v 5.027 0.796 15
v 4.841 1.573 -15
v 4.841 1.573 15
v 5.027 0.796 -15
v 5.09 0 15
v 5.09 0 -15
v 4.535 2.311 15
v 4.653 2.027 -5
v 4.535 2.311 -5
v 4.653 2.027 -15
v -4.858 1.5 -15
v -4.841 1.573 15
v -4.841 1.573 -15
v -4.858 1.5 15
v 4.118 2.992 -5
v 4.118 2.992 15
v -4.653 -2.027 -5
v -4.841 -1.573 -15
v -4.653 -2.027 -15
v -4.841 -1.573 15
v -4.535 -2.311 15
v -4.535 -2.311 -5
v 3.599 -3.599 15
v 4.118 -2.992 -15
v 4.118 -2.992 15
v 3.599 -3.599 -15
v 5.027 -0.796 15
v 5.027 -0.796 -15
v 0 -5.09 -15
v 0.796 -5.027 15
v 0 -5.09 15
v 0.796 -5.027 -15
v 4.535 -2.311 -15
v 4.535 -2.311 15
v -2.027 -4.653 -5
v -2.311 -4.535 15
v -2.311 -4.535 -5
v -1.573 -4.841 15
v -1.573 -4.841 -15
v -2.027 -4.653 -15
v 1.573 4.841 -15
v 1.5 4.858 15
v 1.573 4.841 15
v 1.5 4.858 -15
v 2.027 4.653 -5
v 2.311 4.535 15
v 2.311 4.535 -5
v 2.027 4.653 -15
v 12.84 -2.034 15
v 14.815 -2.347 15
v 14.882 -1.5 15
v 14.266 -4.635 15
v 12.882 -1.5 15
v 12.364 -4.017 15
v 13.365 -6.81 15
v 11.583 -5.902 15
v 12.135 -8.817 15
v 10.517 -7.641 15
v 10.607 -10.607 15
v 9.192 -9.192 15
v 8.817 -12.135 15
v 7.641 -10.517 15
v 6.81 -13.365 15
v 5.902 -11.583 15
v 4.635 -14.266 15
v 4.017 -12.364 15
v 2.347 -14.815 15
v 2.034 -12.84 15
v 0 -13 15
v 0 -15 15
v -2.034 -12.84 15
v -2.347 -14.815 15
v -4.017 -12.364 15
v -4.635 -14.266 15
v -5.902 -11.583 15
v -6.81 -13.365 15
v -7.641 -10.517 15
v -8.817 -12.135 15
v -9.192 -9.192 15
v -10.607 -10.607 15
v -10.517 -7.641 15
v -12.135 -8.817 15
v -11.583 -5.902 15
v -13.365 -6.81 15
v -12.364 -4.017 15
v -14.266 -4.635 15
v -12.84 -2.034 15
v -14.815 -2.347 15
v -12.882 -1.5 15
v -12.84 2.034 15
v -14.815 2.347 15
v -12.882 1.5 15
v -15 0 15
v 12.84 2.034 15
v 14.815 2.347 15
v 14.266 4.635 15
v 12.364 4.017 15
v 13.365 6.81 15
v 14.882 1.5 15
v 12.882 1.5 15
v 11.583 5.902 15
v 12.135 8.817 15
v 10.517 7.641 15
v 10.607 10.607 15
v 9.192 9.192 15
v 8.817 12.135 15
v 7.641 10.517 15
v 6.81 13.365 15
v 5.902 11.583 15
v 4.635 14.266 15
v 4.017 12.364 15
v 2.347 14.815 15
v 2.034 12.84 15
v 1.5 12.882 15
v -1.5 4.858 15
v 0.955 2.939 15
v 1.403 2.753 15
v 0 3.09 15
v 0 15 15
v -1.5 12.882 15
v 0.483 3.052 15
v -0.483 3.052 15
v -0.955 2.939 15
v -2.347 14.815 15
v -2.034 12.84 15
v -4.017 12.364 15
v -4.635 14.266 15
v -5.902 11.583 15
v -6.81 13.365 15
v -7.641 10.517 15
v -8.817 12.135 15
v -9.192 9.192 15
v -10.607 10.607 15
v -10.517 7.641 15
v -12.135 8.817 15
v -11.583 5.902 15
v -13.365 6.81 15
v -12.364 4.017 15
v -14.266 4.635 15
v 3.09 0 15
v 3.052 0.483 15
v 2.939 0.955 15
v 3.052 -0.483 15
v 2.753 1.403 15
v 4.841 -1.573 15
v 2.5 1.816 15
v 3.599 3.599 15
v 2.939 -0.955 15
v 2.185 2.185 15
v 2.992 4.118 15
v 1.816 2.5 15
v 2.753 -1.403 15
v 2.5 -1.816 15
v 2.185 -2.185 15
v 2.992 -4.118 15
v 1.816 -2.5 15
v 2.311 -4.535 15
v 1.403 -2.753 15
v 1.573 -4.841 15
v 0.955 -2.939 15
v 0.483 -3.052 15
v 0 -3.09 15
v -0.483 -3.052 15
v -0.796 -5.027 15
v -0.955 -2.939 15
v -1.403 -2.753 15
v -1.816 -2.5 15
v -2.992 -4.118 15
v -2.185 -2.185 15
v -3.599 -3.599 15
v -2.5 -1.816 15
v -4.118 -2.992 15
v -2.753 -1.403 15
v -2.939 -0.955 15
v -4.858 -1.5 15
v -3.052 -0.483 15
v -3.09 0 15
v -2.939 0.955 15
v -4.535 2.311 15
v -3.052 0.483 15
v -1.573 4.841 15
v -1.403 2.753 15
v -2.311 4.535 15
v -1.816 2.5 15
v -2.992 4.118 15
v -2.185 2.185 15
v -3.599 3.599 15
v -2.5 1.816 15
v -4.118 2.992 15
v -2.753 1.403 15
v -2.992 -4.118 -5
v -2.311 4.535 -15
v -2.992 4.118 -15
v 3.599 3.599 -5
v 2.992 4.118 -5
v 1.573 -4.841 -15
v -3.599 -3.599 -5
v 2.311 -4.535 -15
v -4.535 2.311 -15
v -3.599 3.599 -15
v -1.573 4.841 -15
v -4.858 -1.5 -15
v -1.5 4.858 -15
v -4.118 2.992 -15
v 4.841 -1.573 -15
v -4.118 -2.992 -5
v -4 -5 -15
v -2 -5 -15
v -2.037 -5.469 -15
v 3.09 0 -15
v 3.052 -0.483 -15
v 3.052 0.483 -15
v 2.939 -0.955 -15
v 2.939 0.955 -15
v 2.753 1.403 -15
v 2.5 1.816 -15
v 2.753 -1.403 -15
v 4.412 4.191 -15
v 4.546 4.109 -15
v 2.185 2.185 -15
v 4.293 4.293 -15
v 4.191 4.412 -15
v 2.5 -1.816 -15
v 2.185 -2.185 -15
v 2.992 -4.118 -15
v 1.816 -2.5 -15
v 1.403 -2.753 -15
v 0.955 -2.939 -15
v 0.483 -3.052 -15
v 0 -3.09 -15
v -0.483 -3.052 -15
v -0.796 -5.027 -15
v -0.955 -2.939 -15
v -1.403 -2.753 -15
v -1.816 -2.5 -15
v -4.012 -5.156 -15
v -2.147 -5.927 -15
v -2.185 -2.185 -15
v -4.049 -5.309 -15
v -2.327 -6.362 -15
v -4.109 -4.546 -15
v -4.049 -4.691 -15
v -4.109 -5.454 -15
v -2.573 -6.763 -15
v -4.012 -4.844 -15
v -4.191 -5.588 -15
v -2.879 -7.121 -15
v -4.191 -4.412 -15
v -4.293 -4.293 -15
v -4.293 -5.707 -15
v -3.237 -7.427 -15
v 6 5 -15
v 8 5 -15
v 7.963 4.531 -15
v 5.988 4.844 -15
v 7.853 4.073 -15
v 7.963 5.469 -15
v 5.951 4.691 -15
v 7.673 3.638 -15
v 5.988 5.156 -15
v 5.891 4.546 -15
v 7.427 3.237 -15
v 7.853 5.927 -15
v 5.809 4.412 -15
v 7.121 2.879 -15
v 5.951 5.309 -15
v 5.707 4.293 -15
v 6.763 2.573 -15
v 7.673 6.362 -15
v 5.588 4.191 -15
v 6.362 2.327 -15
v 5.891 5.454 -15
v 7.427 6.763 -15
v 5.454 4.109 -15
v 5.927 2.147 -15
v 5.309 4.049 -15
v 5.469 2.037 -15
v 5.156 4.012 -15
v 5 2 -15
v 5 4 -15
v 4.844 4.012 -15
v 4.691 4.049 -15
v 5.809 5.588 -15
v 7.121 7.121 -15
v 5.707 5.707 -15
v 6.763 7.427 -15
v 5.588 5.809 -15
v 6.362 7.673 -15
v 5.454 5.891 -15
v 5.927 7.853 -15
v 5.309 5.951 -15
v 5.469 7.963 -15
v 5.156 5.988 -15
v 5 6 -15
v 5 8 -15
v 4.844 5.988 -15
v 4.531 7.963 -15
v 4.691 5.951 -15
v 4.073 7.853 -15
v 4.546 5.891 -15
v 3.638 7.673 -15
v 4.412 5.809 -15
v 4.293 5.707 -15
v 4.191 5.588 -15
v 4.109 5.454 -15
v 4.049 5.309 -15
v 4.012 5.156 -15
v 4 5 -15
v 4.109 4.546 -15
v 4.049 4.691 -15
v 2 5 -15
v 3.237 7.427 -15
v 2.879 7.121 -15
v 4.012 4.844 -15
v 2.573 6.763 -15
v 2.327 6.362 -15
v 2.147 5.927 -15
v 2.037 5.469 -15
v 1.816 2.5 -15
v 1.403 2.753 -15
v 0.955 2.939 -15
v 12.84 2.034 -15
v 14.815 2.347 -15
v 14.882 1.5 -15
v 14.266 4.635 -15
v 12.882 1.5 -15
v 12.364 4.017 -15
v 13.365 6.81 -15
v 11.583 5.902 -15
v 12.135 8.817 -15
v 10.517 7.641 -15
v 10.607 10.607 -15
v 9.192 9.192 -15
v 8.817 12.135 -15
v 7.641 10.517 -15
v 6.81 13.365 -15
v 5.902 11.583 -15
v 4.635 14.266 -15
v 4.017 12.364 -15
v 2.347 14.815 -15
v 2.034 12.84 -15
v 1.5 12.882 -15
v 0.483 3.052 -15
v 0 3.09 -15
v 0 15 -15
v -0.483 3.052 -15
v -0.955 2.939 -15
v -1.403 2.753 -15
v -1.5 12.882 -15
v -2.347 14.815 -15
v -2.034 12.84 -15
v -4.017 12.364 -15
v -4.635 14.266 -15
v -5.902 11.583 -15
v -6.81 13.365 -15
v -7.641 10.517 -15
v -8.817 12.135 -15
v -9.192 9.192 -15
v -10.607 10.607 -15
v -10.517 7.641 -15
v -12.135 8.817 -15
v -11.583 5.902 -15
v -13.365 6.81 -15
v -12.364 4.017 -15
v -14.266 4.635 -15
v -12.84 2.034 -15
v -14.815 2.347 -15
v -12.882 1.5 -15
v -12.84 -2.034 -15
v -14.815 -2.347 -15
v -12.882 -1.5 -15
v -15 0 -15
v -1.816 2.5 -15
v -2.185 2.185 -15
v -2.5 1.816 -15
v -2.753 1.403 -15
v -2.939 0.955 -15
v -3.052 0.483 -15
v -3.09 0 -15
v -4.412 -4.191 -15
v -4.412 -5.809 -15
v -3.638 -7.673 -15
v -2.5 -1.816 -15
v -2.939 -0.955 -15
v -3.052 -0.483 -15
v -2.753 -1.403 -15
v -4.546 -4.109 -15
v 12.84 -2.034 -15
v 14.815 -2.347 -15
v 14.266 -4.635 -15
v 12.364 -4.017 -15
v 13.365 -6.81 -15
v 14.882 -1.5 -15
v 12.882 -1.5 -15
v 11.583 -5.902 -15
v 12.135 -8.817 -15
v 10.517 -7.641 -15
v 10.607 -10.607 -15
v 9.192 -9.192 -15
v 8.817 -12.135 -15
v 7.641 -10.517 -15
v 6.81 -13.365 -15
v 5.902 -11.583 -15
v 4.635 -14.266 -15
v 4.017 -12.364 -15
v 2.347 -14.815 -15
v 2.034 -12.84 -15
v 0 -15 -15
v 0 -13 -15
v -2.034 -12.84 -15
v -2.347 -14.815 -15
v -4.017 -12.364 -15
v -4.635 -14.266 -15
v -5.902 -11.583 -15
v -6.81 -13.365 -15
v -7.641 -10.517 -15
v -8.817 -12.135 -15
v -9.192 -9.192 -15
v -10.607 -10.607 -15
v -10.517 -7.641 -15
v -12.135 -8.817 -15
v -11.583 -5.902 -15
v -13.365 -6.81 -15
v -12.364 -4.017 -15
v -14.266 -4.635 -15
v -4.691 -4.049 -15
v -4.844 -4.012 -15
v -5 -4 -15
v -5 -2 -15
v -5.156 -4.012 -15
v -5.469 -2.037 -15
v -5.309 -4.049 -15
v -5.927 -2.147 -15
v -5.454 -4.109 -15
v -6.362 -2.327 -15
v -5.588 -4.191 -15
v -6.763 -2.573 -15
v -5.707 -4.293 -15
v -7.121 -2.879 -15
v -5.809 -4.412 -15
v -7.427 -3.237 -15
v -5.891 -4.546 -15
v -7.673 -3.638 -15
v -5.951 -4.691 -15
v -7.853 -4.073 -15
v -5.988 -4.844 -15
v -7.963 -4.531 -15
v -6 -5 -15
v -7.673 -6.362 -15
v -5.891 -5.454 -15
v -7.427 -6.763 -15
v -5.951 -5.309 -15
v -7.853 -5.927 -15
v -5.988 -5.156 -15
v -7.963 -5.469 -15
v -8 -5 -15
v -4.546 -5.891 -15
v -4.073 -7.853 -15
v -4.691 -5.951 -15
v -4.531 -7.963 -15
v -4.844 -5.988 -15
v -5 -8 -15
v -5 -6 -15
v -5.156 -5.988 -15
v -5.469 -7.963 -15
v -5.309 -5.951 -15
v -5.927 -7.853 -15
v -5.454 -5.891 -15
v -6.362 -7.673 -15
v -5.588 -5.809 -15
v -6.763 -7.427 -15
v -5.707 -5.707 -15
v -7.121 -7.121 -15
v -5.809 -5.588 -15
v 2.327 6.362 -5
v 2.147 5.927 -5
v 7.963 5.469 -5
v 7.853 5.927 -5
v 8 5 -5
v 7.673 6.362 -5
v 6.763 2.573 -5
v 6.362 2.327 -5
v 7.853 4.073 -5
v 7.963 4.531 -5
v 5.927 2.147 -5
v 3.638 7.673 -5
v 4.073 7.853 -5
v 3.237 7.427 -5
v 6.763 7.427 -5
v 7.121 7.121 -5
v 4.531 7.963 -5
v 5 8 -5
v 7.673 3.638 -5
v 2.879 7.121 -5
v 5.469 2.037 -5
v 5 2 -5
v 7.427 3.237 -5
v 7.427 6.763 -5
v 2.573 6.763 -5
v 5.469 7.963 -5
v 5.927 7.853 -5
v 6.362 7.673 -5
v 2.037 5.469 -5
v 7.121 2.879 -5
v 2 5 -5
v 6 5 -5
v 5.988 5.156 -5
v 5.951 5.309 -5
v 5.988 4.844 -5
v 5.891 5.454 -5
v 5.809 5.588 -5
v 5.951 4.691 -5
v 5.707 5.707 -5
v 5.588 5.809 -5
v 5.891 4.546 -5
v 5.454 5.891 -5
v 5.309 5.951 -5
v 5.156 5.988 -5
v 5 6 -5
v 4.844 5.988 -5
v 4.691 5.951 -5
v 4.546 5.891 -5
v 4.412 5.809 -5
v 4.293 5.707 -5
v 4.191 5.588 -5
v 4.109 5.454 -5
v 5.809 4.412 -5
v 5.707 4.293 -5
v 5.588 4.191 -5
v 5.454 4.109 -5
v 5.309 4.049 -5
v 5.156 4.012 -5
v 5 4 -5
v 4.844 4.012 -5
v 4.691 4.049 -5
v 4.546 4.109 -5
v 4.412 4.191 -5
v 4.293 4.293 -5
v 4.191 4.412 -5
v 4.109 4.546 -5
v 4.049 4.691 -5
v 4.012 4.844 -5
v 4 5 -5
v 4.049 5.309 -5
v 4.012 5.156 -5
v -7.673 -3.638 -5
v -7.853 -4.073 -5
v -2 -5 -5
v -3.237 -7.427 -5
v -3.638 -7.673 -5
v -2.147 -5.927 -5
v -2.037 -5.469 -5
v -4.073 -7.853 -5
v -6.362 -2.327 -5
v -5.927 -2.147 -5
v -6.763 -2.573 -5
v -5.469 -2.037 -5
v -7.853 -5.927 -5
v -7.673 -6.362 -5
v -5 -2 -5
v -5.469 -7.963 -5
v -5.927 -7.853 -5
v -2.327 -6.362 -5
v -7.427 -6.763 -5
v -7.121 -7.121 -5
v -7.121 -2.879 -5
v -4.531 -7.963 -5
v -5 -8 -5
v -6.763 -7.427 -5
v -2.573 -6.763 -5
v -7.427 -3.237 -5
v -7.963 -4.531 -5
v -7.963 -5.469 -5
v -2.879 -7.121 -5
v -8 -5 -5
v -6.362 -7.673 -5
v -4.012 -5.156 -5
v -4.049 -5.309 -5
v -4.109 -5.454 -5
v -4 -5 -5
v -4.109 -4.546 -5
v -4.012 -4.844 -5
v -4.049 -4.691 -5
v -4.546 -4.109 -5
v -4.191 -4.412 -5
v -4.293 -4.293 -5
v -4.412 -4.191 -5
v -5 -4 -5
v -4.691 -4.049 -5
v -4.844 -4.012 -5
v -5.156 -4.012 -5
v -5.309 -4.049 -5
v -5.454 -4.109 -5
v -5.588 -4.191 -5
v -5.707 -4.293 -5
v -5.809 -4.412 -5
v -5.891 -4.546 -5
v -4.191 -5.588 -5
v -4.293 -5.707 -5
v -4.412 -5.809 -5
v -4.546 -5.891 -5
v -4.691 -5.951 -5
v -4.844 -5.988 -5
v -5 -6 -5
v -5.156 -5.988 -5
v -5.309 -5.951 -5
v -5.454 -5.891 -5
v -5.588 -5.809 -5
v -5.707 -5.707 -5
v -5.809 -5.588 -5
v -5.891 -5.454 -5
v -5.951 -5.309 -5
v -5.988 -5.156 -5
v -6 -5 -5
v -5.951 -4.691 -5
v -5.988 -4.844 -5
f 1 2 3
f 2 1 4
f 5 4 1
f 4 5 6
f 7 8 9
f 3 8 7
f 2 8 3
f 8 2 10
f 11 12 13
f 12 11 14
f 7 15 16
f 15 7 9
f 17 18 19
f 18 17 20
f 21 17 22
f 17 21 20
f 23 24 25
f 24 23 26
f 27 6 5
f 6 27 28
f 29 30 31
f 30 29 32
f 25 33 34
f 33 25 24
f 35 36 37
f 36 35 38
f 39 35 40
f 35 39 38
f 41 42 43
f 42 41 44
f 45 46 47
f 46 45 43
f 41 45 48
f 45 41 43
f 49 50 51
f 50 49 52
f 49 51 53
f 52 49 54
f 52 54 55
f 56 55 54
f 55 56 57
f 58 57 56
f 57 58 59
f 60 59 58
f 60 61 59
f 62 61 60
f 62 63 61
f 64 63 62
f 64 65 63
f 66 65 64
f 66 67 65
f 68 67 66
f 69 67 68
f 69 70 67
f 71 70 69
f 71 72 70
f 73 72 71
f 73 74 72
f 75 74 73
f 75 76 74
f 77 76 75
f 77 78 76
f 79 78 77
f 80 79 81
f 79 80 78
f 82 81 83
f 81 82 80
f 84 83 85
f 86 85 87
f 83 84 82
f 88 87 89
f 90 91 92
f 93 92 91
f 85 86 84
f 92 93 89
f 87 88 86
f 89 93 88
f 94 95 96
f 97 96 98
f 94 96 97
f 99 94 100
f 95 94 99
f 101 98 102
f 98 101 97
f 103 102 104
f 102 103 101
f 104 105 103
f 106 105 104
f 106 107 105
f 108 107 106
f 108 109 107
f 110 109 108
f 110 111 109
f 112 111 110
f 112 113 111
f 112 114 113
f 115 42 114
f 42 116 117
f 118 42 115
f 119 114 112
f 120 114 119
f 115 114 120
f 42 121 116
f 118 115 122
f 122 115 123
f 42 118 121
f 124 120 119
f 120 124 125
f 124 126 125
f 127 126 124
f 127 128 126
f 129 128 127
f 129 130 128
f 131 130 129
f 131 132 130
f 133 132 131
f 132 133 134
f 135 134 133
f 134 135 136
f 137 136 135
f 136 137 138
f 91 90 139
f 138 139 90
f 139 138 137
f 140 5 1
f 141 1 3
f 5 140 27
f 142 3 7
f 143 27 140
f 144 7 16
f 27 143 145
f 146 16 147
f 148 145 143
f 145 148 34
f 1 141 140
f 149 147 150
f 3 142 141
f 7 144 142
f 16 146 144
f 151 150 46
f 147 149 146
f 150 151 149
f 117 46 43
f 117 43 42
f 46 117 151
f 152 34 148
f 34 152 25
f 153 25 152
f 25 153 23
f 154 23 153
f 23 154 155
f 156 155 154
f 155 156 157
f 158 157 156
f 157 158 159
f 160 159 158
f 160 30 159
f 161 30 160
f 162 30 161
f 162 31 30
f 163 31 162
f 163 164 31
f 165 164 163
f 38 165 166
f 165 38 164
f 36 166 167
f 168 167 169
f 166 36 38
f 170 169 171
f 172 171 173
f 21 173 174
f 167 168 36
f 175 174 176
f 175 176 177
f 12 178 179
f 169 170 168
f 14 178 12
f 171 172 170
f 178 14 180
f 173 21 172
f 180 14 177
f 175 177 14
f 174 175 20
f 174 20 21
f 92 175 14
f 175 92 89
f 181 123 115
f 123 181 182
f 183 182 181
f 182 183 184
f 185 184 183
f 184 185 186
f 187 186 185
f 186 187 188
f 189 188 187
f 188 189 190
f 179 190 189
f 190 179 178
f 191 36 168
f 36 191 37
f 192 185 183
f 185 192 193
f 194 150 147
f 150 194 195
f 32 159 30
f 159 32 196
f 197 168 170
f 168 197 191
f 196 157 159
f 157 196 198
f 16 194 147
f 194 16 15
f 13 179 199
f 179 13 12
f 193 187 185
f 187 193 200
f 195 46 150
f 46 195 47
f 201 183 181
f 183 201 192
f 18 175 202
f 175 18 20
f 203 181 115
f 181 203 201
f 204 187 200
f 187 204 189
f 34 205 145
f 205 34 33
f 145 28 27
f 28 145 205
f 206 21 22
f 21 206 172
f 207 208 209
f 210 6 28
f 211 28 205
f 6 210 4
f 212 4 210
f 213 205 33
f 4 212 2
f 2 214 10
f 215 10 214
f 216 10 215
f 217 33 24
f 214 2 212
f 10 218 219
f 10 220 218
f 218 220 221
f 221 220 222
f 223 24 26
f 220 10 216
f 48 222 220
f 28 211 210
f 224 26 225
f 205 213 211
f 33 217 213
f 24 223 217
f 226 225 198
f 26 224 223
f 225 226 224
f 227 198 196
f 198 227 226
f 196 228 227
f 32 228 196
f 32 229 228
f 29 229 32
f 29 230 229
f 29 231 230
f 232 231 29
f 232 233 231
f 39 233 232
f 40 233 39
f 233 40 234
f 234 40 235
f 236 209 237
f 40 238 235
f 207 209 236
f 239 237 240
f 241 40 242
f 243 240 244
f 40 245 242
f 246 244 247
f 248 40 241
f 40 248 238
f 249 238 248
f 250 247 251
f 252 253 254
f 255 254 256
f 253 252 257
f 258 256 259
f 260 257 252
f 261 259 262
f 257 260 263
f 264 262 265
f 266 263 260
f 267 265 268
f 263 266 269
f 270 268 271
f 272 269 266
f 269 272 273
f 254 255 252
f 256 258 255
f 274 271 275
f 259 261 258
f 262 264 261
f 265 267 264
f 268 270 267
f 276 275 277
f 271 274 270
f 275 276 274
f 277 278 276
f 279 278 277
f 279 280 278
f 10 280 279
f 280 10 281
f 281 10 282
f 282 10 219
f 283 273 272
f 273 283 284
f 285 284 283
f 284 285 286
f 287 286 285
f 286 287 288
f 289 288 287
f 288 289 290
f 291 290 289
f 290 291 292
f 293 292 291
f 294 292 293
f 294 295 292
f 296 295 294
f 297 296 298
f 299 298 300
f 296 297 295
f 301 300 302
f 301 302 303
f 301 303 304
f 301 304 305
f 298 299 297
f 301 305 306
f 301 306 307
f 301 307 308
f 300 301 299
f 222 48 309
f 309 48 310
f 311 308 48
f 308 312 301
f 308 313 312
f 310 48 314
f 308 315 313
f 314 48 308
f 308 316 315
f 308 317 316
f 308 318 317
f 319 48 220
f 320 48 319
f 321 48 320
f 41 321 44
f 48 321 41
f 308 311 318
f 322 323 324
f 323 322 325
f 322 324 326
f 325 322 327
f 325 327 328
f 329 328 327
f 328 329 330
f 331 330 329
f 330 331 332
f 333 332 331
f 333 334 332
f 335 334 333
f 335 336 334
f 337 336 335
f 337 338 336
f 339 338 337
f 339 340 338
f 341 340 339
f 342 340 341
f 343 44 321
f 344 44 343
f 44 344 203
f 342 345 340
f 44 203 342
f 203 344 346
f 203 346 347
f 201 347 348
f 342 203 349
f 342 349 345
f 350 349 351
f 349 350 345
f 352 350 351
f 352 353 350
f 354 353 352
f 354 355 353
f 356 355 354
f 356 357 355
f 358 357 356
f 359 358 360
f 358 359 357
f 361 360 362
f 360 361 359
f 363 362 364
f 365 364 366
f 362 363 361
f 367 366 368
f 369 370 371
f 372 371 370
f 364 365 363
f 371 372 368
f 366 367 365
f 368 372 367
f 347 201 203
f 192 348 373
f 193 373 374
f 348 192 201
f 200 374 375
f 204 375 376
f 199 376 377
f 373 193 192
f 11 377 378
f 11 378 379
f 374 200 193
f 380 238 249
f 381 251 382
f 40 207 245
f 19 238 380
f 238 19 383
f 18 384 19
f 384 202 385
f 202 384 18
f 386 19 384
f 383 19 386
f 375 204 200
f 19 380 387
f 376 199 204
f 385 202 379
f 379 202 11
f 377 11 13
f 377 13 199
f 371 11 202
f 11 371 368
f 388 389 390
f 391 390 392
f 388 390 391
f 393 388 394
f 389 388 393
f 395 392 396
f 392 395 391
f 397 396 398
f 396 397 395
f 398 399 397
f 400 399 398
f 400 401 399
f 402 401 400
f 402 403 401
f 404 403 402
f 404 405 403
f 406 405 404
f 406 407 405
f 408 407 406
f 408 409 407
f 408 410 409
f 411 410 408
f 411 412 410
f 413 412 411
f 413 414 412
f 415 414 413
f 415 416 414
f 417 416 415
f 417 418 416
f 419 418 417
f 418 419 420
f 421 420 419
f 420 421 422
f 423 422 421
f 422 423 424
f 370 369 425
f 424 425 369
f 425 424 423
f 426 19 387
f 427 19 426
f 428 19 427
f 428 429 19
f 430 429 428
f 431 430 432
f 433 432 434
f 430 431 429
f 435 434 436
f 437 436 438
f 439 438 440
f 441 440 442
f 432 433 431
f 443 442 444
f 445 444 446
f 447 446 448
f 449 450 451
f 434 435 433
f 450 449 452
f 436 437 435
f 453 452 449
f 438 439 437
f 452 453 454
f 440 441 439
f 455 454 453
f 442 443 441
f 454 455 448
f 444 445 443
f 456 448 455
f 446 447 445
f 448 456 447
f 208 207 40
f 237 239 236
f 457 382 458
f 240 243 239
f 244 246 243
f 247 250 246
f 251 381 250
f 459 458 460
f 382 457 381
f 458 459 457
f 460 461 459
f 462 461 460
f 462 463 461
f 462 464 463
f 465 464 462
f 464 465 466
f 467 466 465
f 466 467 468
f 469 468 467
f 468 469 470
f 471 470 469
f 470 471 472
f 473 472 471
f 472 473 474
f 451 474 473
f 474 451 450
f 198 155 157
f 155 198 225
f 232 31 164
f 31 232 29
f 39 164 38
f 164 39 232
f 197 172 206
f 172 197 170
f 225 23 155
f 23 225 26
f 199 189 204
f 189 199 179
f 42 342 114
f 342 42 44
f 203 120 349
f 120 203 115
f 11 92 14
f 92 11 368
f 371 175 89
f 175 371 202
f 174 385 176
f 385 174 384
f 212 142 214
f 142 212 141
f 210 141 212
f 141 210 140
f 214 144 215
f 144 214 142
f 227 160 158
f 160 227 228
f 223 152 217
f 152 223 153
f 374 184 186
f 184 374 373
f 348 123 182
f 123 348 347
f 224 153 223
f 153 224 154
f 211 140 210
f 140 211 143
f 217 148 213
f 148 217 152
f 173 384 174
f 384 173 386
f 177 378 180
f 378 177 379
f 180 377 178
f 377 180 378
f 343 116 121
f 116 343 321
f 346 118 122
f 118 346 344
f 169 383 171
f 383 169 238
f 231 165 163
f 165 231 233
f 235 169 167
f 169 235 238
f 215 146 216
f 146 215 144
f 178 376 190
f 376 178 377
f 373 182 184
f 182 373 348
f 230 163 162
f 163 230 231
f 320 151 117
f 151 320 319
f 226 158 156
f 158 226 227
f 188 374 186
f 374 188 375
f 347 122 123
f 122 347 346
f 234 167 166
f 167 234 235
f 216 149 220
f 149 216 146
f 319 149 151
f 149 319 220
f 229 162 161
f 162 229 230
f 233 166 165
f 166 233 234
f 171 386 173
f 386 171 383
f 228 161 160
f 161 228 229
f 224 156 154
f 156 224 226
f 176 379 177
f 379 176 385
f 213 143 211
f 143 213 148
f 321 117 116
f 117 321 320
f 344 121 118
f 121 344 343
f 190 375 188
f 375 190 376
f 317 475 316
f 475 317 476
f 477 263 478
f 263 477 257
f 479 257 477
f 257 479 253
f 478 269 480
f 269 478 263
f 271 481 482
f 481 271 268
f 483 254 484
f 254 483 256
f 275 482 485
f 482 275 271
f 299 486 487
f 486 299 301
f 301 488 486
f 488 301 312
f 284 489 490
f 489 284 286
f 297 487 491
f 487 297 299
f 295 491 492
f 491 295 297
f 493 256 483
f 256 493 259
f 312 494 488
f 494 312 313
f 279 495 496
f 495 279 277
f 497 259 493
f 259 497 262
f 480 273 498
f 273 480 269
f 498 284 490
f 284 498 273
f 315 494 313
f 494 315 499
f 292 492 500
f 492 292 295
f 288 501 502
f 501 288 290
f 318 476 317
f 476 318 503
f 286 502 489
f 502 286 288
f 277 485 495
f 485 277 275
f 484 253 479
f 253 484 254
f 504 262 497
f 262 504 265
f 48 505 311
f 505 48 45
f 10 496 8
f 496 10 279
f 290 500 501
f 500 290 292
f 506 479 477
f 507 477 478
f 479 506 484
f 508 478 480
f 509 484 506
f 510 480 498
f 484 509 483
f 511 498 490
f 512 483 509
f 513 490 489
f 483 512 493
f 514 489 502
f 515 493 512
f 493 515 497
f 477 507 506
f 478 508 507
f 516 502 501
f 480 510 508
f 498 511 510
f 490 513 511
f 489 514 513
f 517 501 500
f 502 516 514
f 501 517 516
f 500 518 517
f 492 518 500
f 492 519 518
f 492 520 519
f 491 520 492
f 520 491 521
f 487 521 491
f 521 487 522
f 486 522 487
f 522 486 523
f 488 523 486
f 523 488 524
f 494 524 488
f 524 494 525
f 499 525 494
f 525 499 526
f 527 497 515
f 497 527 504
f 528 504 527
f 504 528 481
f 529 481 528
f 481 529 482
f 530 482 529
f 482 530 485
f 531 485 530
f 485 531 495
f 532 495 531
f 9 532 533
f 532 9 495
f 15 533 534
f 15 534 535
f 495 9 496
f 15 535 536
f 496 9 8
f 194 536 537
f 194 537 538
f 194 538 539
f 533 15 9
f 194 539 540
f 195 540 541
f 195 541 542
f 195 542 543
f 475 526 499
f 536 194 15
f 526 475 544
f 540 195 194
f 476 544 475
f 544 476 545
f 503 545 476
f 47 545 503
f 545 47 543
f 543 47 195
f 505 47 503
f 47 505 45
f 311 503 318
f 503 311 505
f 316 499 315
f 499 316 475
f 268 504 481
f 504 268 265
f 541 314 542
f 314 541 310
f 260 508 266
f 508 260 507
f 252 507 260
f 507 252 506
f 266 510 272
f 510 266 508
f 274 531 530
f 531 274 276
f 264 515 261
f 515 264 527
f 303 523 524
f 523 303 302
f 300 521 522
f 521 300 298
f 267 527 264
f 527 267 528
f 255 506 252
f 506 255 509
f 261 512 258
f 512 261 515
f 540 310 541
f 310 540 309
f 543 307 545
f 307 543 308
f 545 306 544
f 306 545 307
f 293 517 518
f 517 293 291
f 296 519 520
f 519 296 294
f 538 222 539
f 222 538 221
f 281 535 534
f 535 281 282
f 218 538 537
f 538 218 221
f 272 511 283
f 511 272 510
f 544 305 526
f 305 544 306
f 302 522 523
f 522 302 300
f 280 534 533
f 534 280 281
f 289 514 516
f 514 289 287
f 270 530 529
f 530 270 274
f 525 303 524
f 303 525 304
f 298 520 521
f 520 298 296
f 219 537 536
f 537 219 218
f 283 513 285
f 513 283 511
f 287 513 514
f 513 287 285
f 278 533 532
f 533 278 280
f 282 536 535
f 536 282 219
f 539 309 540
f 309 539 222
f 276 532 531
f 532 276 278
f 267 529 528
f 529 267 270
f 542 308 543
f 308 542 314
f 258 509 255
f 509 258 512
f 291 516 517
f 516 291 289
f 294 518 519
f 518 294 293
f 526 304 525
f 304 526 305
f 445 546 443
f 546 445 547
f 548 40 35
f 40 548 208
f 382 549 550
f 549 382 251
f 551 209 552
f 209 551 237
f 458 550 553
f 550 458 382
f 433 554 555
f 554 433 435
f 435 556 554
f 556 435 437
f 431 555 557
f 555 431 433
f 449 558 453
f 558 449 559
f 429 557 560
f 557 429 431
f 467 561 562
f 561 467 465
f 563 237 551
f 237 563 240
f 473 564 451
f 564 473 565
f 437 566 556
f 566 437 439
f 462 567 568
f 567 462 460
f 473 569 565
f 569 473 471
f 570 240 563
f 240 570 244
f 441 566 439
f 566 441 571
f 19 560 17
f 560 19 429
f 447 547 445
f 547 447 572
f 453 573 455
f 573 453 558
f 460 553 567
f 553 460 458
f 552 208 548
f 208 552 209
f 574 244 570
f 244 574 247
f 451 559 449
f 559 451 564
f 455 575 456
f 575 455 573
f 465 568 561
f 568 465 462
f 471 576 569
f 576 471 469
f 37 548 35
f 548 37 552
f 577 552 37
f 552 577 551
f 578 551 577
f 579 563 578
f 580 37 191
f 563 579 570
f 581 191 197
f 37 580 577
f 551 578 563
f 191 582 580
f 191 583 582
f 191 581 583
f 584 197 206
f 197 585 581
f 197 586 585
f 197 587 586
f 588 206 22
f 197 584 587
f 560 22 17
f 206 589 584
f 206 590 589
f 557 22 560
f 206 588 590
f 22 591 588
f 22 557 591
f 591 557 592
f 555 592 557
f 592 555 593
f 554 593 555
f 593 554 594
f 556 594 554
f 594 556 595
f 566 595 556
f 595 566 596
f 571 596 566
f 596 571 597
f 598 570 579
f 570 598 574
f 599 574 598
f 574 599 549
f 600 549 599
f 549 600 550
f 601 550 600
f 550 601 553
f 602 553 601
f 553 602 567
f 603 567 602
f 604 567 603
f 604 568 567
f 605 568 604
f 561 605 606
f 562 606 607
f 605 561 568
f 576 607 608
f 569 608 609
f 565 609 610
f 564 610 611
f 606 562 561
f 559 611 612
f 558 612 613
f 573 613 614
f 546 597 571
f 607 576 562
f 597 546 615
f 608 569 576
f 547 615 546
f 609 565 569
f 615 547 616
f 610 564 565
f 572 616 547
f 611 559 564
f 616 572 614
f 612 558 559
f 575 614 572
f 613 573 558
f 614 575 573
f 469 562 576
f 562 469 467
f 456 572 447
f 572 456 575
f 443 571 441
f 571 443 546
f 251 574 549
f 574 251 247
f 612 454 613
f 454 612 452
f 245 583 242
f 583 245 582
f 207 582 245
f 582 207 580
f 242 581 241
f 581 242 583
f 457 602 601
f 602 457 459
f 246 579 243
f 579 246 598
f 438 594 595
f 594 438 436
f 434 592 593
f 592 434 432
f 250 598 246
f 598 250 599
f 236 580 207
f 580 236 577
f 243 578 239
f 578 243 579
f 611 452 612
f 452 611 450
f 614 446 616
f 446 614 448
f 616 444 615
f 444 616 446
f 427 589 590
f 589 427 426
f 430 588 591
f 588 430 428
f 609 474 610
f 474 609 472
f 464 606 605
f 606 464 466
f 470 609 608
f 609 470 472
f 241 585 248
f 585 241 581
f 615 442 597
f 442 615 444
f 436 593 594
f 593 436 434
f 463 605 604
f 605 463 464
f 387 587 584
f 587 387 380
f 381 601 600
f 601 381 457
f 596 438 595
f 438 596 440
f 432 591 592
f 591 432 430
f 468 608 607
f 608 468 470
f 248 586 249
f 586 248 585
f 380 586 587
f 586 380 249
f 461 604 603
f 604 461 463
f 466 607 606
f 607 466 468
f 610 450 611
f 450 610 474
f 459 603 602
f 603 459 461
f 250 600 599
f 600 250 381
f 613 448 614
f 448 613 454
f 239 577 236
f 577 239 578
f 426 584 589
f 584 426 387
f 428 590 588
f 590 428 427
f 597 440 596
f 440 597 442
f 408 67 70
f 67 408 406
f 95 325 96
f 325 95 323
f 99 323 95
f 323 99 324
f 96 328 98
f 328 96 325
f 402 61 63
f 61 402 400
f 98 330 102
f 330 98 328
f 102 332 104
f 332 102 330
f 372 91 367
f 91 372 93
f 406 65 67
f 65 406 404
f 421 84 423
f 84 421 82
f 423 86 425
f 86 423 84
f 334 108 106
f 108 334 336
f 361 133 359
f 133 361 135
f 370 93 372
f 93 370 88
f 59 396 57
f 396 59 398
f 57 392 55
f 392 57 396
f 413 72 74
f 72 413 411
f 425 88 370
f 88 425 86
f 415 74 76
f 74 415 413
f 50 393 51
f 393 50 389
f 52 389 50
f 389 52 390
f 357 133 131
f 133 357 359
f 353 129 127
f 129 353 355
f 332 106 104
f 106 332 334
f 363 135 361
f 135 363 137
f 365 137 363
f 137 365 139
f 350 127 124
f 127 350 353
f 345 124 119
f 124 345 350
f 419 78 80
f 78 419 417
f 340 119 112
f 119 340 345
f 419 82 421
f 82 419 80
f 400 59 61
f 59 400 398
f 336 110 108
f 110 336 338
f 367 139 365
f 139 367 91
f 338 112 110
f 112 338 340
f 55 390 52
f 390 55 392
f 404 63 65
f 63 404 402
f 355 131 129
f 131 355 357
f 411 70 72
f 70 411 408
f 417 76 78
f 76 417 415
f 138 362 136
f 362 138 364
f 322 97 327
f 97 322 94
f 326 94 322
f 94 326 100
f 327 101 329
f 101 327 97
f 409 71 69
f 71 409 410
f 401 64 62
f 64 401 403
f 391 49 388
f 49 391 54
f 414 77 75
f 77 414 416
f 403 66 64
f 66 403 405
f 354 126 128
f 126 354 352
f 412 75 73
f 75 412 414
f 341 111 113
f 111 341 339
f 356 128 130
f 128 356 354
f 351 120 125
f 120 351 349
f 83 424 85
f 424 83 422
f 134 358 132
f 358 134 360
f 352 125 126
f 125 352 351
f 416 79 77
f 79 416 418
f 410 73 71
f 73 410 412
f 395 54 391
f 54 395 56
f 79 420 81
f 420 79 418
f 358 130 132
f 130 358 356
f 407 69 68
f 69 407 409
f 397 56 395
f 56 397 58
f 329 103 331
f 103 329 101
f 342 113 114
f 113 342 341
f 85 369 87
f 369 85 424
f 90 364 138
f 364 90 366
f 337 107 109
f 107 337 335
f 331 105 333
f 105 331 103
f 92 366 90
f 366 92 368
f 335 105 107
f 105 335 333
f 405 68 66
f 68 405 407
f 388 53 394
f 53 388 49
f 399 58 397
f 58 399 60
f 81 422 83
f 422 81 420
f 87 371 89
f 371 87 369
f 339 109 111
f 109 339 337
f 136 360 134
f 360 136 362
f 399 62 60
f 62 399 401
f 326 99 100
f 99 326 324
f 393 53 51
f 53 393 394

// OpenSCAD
ID=30;
OD=33.5;
TT_LARGE=6.18;
TT_SMALL=4.15;
WALL=5;
HEIGHT=20;

$fn=40;

module PVC() {
    difference() {
        cylinder(d=OD, h=30, center=true);
        cylinder(d=ID, h=31, center=true);
    }
}

module tube_guide() {
    difference() {
        union() {
            cylinder(d=TT_LARGE+4, h=30, center=true);
            //rotate([0,0,45])
            translate([0, ID/4])
                cube([3, ID/2, 30], center=true);
            translate([-ID/4, 0])
                cube([ID/2, 3, 30], center=true);
        }
        cylinder(d=TT_LARGE, h=31, center=true);
    }
}


module cable_hole() {
    difference() {
        cylinder(d=6, h=10, center=true);
        cylinder(d=2, h=11, center=true);
    }
}

module cable_holes() {
    translate([5, 5, -10])
        cable_hole();
    translate([-5, -5, -10])
        cable_hole();
    //translate([-(OD/2+WALL)/2-4, -(OD/2+WALL)/2-4, -5])
    //    cable_hole();
    //translate([-(OD/2+WALL), 0, -5])
    //    cable_hole();
    //translate([-(OD/2+WALL)/2-4, (OD/2+WALL)/2+4, -5])
    //    cable_hole();
    //translate([(OD/2+WALL)/2+4, -(OD/2+WALL)/2-4, -5])
    //    cable_hole();
}


module insert() {
    tube_guide();
    cable_holes();
    difference() {
        cylinder(d=ID, h=30, center=true);
        cylinder(d=ID-4, h=31, center=true);
        translate([ID/2, 0, 0])
            cube([20,3,31], center=true);
    }
}

difference() {
    insert();
    PVC();
}

/*
module PVC() {
    cylinder(d=OD, h=50, center=true);
}

module slot() {
    translate([OD/2, 0, 0])
        cube([HEIGHT, 3, 35], center=true);
}

module clamp_holes() {
    translate([0,0,5]) {
        translate([5, 0])
            cylinder(d=3.5, h=10, center=true);
        
        translate([HEIGHT-5, 0])
            cylinder(d=3.5, h=10, center=true);

        translate([5, 0, -HEIGHT/2]) 
            cylinder(d=2.1, h=10, center=true);

        translate([HEIGHT-5, 0, -HEIGHT/2]) 
            cylinder(d=2.1, h=10, center=true); 
    }   
}

module clamp_clampies() {
    difference() {
        translate([OD/2, 0, 0])
            cube([16, 10, HEIGHT], center=true);
        
        translate([OD/2+5, 0, HEIGHT/2])
            rotate([90, 90])
                clamp_holes();
    }
}

module tt_large_neg() {
     cylinder(d=TT_LARGE, h=HEIGHT+1, center=true);
}

module tt_large() {
        difference() {
            cylinder(d=TT_LARGE+3, h=HEIGHT, center=true);
            //cylinder(d=TT_LARGE, h=HEIGHT+1, center=true);
        }
}

module tube_guides() {
    difference() {
        hull() {
            translate([0, OD/2+WALL+1, 0])
                tt_large();
            
            translate([0, -OD/2-WALL-1, 0])
                tt_large();
        }
        
        translate([0, OD/2+WALL+1, 0])
            tt_large_neg();
        translate([0, -OD/2-WALL-1, 0])
            tt_large_neg();
    }
}

module cable_hole() {
    difference() {
        cylinder(d=6, h=10, center=true);
        cylinder(d=2, h=11, center=true);
    }
}
module cable_holes() {
    translate([(OD/2+WALL)/2+4, (OD/2+WALL)/2+4, -5])
        cable_hole();
    translate([-(OD/2+WALL)/2-4, -(OD/2+WALL)/2-4, -5])
        cable_hole();
    translate([-(OD/2+WALL), 0, -5])
        cable_hole();
    translate([-(OD/2+WALL)/2-4, (OD/2+WALL)/2+4, -5])
        cable_hole();
    translate([(OD/2+WALL)/2+4, -(OD/2+WALL)/2-4, -5])
        cable_hole();
}

module _clamp_type_1() {
    cylinder(d=OD+WALL, h=HEIGHT, center=true);
    clamp_clampies();
    tube_guides();
}

module clamp_type_1() {
    difference() {
        _clamp_type_1();
        slot();
        PVC();
    }
    
    cable_holes();
}

module _clamp_type_2() {
    difference() {
        union() {
            clamp_type_1();
            mirror([180,0,0])
                clamp_type_1();
            tube_guides();
        }
        mirror([180,0,0])
            slot();
    }
}

module clamp_type_2() {
    difference() {
        _clamp_type_2();
        slot();
        PVC();
    }
}

clamp_type_1();

translate([OD*1.75, 0]) clamp_type_2();
*/
